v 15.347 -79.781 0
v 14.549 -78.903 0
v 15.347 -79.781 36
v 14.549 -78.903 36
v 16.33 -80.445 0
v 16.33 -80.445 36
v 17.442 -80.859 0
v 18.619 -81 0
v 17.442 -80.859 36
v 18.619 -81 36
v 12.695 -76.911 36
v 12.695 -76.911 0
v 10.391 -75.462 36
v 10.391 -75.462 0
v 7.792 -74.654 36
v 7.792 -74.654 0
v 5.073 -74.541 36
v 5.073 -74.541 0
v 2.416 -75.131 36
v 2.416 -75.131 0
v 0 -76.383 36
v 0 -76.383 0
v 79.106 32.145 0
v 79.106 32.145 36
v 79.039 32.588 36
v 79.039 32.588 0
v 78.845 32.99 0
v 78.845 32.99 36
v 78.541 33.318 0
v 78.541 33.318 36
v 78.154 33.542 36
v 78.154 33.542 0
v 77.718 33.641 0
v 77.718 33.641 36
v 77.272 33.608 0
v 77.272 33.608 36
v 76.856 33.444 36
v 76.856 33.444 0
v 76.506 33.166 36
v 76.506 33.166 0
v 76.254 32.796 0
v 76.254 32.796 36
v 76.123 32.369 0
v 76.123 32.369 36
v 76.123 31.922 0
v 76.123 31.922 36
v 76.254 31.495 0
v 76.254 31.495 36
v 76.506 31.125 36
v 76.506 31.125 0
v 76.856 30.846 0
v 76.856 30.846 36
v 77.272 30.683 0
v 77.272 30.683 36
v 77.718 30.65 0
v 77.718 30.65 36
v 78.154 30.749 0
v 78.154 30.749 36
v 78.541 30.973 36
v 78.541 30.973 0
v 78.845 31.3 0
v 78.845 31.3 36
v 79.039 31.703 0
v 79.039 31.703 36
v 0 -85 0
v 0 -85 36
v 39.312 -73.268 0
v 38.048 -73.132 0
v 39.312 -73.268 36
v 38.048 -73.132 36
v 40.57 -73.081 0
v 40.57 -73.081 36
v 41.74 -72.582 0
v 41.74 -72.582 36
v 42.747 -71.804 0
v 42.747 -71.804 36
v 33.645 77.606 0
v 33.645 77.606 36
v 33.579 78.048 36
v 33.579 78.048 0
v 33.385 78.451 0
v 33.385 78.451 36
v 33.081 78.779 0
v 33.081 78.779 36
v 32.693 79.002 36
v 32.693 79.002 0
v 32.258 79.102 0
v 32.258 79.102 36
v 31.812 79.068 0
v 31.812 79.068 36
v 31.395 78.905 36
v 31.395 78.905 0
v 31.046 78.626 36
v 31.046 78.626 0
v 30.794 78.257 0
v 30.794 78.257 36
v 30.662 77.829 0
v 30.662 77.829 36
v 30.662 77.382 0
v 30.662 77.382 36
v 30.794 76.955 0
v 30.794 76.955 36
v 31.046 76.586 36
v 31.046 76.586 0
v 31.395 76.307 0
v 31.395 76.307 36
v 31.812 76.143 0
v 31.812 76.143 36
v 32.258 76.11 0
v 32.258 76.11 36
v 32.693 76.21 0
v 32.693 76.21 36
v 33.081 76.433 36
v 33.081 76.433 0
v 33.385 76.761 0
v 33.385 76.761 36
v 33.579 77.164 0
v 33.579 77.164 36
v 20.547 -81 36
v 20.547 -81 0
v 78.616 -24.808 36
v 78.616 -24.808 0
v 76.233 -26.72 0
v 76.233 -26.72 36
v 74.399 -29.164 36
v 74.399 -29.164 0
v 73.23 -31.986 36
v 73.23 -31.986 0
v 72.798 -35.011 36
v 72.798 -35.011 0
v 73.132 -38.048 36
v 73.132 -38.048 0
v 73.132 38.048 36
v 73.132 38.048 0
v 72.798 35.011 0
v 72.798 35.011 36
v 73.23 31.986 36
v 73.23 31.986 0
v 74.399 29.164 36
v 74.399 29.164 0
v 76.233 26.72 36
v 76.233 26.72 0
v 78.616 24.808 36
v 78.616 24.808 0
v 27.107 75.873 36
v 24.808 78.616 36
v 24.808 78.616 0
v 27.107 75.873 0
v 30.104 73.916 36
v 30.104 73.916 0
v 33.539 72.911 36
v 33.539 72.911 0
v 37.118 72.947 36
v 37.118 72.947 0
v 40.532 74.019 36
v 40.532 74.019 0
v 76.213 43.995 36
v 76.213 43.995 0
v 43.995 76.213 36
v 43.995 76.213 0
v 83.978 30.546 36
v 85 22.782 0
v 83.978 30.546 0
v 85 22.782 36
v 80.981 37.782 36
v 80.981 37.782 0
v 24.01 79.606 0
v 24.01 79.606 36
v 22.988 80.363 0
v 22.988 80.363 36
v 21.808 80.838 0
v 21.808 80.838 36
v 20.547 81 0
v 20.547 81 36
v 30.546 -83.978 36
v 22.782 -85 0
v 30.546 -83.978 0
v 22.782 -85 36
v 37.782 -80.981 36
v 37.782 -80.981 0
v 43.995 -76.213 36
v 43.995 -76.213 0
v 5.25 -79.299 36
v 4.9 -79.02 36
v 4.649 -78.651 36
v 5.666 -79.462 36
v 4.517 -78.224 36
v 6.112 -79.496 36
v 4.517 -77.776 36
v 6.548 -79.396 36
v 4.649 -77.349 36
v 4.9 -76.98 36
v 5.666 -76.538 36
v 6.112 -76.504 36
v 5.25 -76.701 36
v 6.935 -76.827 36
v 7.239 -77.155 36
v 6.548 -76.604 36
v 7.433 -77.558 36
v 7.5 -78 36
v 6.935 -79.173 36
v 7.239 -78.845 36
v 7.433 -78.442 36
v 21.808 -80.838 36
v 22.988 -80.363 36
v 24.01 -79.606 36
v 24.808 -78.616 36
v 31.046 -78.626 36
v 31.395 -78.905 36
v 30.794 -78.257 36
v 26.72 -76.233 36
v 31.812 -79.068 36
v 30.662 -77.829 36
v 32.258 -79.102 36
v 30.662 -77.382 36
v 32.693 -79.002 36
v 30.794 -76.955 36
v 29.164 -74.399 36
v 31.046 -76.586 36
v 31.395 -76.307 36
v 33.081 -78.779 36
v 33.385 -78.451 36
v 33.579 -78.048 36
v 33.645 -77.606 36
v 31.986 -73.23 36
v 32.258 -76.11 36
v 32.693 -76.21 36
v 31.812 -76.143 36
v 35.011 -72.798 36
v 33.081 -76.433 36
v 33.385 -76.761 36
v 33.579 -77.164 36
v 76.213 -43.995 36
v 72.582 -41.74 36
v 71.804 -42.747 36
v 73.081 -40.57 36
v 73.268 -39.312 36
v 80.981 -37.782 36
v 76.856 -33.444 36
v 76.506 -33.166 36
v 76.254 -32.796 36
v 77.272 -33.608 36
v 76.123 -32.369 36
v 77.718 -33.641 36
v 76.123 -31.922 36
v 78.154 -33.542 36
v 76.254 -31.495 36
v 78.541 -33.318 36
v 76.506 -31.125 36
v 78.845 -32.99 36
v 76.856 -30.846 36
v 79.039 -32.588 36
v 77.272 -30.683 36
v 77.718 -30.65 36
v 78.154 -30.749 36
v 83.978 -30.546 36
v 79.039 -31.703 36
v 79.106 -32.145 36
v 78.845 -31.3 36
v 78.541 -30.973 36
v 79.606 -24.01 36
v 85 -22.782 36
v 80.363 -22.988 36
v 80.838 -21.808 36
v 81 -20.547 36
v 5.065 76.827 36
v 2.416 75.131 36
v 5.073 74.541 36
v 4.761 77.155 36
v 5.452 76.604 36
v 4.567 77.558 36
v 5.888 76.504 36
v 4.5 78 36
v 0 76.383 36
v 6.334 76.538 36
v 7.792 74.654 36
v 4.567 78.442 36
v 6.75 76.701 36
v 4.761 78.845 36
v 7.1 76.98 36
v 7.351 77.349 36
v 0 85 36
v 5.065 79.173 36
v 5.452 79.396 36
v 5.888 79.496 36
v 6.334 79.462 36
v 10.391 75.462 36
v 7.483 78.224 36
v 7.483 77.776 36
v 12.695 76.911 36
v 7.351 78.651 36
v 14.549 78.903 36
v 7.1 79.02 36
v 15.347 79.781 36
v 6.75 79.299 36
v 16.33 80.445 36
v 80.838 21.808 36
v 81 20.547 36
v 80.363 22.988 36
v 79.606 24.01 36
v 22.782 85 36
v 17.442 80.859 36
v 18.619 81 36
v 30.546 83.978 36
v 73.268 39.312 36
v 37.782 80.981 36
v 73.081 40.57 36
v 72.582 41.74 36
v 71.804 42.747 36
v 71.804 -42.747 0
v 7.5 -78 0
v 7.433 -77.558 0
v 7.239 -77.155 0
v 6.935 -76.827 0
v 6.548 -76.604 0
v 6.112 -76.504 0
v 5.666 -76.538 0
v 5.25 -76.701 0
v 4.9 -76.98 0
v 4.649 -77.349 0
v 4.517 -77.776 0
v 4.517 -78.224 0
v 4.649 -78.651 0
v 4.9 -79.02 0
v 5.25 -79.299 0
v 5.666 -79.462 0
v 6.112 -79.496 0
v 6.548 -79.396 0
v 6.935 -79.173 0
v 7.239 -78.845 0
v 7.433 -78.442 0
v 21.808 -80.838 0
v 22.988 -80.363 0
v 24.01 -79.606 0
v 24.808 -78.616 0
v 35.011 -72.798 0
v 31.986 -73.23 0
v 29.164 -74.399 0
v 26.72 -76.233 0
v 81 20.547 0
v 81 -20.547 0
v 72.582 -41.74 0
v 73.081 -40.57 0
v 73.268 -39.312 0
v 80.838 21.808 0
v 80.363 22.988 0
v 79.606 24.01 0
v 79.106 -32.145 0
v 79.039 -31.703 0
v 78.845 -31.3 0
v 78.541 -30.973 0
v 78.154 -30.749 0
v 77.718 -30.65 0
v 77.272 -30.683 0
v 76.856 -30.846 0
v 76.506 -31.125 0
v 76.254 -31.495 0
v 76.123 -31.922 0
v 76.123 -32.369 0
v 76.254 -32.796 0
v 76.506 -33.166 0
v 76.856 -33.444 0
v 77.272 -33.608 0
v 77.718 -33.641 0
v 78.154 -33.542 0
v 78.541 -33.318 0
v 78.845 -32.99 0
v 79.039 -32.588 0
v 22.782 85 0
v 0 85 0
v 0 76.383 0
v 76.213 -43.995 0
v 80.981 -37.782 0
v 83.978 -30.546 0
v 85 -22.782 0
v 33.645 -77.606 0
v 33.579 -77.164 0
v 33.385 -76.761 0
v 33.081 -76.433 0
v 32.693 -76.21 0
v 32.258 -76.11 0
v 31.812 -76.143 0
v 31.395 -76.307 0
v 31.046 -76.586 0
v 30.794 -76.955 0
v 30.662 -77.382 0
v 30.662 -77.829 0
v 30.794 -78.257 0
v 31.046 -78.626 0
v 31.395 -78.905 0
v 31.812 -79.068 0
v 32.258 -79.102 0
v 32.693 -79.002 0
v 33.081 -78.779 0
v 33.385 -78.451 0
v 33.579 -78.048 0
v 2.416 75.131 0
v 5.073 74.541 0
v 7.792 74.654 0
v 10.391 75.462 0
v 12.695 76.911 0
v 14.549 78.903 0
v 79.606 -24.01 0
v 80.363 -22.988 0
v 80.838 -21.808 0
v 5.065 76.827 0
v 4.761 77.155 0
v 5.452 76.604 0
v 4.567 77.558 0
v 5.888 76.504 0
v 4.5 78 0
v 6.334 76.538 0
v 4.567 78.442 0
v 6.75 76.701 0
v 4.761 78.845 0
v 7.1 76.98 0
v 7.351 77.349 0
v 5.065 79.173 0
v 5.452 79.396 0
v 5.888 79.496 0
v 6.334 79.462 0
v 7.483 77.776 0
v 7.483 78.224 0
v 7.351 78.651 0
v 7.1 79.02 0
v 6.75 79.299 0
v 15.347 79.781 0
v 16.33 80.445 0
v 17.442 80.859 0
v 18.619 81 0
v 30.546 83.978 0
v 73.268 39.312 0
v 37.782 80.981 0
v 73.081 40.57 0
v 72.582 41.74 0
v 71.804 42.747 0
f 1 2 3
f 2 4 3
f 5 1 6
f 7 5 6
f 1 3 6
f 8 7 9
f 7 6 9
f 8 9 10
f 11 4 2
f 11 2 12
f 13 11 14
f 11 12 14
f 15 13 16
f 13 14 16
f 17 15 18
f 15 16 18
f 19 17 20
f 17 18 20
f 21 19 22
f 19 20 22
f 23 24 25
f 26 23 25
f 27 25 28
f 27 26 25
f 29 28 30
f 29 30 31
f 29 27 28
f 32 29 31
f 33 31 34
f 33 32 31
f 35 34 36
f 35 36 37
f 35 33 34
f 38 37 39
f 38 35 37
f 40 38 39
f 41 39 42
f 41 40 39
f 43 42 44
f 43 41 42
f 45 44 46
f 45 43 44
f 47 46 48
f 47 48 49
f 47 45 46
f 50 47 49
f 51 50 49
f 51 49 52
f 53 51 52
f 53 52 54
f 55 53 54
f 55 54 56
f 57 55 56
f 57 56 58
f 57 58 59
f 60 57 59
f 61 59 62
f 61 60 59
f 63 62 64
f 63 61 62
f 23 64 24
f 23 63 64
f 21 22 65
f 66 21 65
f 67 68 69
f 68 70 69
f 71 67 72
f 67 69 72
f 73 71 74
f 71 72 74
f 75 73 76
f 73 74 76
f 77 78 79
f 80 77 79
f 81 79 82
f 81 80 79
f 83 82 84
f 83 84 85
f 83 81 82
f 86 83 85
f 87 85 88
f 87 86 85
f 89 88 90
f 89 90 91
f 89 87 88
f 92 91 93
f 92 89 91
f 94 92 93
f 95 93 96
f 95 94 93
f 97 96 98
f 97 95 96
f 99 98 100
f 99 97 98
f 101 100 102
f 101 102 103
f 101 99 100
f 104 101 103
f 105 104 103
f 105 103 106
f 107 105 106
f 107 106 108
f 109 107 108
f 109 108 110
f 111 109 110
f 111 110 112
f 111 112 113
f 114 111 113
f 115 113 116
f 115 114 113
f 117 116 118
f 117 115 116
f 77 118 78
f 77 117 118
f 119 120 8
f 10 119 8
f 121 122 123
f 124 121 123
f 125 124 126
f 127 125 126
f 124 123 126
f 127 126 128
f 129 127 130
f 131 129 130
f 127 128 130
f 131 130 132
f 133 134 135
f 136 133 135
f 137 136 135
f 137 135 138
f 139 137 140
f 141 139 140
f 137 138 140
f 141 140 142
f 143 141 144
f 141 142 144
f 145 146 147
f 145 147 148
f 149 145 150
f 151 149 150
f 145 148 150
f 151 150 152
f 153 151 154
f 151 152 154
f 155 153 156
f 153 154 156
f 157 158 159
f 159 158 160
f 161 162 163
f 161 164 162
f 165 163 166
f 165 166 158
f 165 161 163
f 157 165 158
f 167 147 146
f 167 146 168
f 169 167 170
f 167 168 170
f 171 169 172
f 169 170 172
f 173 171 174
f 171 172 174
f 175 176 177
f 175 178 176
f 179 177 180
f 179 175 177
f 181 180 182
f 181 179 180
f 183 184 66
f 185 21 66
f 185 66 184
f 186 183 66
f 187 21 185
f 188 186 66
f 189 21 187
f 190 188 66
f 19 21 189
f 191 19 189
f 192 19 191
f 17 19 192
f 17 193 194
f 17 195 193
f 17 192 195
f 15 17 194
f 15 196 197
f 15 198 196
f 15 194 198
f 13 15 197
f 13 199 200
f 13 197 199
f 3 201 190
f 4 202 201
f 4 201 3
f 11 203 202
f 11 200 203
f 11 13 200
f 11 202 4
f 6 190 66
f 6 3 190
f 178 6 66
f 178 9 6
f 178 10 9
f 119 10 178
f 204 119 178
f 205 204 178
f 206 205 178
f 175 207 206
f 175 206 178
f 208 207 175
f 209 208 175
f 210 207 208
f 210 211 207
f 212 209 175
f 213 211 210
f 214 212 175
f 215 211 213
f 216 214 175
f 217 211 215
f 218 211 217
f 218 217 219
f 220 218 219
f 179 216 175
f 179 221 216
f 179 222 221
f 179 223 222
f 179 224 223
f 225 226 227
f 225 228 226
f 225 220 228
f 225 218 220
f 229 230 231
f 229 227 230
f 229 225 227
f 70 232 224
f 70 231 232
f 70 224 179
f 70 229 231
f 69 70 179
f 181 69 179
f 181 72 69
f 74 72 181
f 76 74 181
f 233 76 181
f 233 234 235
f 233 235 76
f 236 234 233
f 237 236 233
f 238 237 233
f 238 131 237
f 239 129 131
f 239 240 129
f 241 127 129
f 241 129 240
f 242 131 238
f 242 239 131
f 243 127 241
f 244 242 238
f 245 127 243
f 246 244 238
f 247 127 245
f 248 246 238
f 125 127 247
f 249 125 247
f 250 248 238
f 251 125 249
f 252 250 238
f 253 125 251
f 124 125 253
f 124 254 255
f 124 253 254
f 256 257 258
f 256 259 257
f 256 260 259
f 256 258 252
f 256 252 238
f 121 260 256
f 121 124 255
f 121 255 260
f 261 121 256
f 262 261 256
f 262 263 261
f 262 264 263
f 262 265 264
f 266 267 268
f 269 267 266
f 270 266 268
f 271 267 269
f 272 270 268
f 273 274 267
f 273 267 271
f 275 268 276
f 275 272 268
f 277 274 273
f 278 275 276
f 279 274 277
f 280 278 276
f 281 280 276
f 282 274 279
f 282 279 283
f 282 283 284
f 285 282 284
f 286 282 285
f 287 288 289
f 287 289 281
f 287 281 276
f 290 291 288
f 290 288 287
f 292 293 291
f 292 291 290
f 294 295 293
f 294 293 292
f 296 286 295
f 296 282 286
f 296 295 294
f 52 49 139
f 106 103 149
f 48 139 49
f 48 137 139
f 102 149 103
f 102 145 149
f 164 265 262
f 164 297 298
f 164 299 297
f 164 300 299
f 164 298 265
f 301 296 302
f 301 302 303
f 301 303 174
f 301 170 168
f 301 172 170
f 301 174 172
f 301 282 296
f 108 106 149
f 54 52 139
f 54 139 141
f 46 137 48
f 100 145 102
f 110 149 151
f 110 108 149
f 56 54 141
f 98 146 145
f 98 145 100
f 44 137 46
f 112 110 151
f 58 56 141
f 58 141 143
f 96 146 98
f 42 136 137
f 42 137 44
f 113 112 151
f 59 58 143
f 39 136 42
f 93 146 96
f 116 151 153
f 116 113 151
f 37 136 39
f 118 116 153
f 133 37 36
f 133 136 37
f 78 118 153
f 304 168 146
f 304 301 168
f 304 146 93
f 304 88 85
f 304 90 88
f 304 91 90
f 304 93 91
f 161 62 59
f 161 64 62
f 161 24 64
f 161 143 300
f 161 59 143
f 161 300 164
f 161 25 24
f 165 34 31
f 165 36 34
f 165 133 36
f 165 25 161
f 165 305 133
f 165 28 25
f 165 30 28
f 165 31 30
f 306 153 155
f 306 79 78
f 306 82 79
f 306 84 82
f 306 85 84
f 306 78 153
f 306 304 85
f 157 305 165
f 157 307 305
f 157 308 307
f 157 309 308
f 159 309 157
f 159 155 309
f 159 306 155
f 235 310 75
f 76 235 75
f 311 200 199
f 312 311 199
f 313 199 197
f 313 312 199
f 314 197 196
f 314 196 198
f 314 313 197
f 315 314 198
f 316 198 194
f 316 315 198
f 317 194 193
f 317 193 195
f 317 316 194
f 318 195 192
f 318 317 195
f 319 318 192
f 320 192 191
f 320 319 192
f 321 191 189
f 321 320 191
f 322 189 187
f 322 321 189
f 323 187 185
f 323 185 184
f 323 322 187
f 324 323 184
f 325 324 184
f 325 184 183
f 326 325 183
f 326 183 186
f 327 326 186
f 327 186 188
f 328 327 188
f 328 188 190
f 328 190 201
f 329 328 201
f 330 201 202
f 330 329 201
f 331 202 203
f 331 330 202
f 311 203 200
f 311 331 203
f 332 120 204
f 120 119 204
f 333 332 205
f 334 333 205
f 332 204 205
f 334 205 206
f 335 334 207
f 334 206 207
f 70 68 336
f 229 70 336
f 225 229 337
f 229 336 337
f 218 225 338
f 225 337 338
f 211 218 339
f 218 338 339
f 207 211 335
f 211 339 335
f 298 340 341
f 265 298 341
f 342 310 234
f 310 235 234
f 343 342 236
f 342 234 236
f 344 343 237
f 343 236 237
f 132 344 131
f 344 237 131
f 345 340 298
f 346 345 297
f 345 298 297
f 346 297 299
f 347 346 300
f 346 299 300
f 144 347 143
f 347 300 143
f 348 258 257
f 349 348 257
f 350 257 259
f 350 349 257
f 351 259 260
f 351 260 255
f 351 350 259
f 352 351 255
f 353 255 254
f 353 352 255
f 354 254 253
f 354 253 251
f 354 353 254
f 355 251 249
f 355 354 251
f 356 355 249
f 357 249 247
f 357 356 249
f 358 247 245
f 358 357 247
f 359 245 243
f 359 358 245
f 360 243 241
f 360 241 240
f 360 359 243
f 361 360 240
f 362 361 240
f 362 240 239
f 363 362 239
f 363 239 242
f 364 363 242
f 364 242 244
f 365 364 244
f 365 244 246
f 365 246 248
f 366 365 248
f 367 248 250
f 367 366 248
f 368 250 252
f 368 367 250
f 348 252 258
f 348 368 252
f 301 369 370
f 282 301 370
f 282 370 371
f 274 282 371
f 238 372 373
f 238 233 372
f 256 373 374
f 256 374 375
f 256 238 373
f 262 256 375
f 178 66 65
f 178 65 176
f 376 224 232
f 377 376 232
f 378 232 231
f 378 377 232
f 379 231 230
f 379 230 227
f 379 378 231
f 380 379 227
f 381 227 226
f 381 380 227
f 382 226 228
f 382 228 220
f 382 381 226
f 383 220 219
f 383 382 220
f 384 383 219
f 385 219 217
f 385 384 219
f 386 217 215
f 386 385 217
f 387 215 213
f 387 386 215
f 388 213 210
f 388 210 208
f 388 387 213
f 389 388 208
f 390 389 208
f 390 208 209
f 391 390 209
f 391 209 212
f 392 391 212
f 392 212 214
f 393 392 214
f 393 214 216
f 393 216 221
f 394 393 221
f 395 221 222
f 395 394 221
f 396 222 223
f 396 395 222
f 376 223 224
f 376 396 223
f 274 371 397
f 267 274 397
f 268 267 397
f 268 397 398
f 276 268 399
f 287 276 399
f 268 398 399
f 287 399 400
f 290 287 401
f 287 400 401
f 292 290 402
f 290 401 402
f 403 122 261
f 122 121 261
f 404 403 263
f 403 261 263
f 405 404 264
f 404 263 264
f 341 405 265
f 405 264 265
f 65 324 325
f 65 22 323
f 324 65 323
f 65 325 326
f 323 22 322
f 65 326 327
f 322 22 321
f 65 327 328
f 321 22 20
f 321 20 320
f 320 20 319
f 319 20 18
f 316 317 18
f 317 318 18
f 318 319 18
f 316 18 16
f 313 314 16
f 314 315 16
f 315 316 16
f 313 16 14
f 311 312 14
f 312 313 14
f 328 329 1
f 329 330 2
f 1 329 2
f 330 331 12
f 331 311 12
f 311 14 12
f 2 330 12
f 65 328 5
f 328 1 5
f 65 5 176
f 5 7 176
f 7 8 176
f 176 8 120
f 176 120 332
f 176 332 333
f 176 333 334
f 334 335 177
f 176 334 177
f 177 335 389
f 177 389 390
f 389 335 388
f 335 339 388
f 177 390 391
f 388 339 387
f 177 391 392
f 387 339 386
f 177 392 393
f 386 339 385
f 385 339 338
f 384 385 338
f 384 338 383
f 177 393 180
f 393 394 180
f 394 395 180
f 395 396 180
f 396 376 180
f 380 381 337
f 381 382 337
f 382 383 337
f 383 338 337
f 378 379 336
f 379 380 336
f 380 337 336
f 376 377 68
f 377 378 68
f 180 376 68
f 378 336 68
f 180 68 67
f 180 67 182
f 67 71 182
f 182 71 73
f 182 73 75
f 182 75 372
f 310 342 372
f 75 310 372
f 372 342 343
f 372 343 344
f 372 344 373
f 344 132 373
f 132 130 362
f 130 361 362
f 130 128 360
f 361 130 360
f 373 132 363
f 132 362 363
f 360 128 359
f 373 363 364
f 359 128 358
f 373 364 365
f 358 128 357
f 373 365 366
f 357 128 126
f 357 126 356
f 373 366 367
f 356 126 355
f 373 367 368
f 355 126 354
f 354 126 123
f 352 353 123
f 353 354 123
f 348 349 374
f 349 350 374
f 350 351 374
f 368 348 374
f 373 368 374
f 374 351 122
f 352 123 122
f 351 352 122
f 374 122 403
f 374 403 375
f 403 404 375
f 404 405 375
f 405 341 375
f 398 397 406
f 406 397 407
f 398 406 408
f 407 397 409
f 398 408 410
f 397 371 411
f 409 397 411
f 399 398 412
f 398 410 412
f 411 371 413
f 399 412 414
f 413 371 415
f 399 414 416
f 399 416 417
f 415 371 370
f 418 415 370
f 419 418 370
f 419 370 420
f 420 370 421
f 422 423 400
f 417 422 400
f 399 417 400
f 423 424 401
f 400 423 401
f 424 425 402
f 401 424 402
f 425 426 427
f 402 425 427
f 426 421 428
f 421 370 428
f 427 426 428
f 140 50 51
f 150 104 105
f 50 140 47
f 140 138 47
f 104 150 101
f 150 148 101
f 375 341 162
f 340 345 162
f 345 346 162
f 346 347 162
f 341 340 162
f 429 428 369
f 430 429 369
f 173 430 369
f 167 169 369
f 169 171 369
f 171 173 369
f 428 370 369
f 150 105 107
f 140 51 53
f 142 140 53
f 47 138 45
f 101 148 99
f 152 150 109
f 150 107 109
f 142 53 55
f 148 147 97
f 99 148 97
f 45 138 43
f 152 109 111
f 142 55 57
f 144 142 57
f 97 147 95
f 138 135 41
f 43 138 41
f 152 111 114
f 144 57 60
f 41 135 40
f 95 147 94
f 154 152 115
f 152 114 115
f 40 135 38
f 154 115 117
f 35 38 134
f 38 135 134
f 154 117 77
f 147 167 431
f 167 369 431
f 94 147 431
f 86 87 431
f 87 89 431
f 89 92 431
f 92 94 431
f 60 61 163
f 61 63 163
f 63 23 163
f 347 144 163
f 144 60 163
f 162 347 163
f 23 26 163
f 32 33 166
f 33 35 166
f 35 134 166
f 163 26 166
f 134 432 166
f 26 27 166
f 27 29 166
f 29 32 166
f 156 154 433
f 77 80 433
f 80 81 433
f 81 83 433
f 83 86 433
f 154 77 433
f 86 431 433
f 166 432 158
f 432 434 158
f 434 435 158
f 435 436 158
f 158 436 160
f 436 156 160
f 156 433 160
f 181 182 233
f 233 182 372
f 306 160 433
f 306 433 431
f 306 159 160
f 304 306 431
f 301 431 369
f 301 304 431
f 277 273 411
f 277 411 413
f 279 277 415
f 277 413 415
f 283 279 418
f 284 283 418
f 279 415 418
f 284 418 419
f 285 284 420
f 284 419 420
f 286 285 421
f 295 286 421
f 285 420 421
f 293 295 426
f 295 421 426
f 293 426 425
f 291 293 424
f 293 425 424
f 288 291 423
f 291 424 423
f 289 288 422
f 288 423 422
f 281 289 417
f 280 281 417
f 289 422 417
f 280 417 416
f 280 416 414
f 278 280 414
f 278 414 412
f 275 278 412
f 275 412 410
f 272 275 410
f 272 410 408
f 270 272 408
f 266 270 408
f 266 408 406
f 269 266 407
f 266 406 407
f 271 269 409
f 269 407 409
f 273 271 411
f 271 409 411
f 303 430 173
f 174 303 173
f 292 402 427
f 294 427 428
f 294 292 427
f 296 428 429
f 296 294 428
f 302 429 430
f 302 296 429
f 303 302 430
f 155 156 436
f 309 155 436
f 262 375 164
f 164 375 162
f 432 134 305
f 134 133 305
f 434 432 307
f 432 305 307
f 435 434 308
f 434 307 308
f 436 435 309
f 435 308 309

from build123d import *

# Parameters (mm, degrees)
F0_R     = 1.5
F1_DEPTH = 36
F2_R     = 30
F3_R     = 5


with BuildPart() as f1:
    # F0 (on Top) → F1 (new body)
    with BuildSketch(Plane.XY):
        with BuildLine():
            Line((3.7082439195, 81), (0, 81))
            Line((0, 81), (0, 78))
            Line((0, 78), (1.8262379212, 78))
            ThreePointArc((1.8262379212, 78), (2.8946339641, 79.4200818425), (3.7082439195, 81))
        make_face()
        with BuildLine():
            Line((1.8262379212, 78), (0, 78))
            Line((0, 78), (0, 76.3831560302))
            ThreePointArc((0, 76.3831560302), (0.9602269984, 77.1383691176), (1.8262379212, 78))
        make_face()
        with BuildLine():
            Line((15.7082439195, 81), (3.7082439195, 81))
            ThreePointArc((3.7082439195, 81), (2.8946339641, 79.4200818425), (1.8262379212, 78))
            ThreePointArc((1.8262379212, 78), (0.9602269984, 77.1383691176), (0, 76.3831560302))
            ThreePointArc((0, 76.3831560302), (8.9608411477, 74.9261020604), (15.7082439195, 81))
        make_face()
        with BuildLine():
            ThreePointArc((7.5, 78), (6, 76.5), (4.5, 78))
            ThreePointArc((4.5, 78), (6, 79.5), (7.5, 78))
        make_face(mode=Mode.SUBTRACT)
        Polygon((35.2081528017, 85), (0, 85), (0, 81), (3.7082439195, 81), (15.7082439195, 81), (23.6789969548, 81), (33.5512985522, 81), (40.5320699577, 74.0192285946), (74.0192285946, 40.5320699577), (81, 33.5512985522), (81, 23.6789969548), (81, -23.6789969548), (81, -33.5512985522), (74.0192285946, -40.5320699577), (40.5320699577, -74.0192285946), (33.5512985522, -81), (35.2081528017, -85), (85, -35.2081528017), (85, 35.2081528017), align=None)
        with BuildLine():
            Line((33.5512985522, 81), (23.6789969548, 81))
            ThreePointArc((23.6789969548, 81), (30.5381379027, 73.7255866944), (40.5320699577, 74.0192285946))
            Line((40.5320699577, 74.0192285946), (33.5512985522, 81))
        make_face()
        with Locations((32.1454083187, 77.6058807309)):
            Circle(F0_R, mode=Mode.SUBTRACT)
        with BuildLine():
            ThreePointArc((74.0192285946, 40.5320699577), (73.7255866944, 30.5381379027), (81, 23.6789969548))
            Line((81, 23.6789969548), (81, 33.5512985522))
            Line((81, 33.5512985522), (74.0192285946, 40.5320699577))
        make_face()
        with Locations((77.6058807309, 32.1454083187)):
            Circle(F0_R, mode=Mode.SUBTRACT)
        with BuildLine():
            ThreePointArc((81, -23.6789969548), (73.7255866944, -30.5381379027), (74.0192285946, -40.5320699577))
            Line((74.0192285946, -40.5320699577), (81, -33.5512985522))
            Line((81, -33.5512985522), (81, -23.6789969548))
        make_face()
        with Locations((77.6058807309, -32.1454083187)):
            Circle(F0_R, mode=Mode.SUBTRACT)
        with BuildLine():
            Line((23.6789969548, -81), (33.5512985522, -81))
            Line((33.5512985522, -81), (40.5320699577, -74.0192285946))
            ThreePointArc((40.5320699577, -74.0192285946), (30.5381379027, -73.7255866944), (23.6789969548, -81))
        make_face()
        with Locations((32.1454083187, -77.6058807309)):
            Circle(F0_R, mode=Mode.SUBTRACT)
        Polygon((0, -81), (0, -85), (35.2081528017, -85), (33.5512985522, -81), (23.6789969548, -81), (15.7082439195, -81), (3.7082439195, -81), align=None)
        with BuildLine():
            ThreePointArc((0, -76.3831560302), (2.1863327454, -78.4247466831), (3.7082439195, -81))
            Line((3.7082439195, -81), (15.7082439195, -81))
            ThreePointArc((15.7082439195, -81), (8.9608411477, -74.9261020604), (0, -76.3831560302))
        make_face()
        with Locations((6, -78)):
            Circle(F0_R, mode=Mode.SUBTRACT)
        with BuildLine():
            Line((0, -76.3831560302), (0, -81))
            Line((0, -81), (3.7082439195, -81))
            ThreePointArc((3.7082439195, -81), (2.1863327454, -78.4247466831), (0, -76.3831560302))
        make_face()
    extrude(amount=F1_DEPTH)

    # F2
    f2_edges = [f1.edges().sort_by_distance(p)[0] for p in [
        (85, -35.208153, 18),
        (85, 35.208153, 18),
        (35.208153, 85, 18),
        (35.208153, -85, 18),
    ]]
    fillet(f2_edges, radius=F2_R)

    # F3
    f3_edges = [f1.edges().sort_by_distance(p)[0] for p in [
        (23.678997, 81, 18),
        (15.708244, 81, 18),
        (74.019229, 40.53207, 18),
        (81, 23.678997, 18),
        (81, -23.678997, 18),
        (74.019229, -40.53207, 18),
        (40.53207, -74.019229, 18),
        (15.708244, -81, 18),
        (23.678997, -81, 18),
    ]]
    fillet(f3_edges, radius=F3_R)


solid = f1.part
